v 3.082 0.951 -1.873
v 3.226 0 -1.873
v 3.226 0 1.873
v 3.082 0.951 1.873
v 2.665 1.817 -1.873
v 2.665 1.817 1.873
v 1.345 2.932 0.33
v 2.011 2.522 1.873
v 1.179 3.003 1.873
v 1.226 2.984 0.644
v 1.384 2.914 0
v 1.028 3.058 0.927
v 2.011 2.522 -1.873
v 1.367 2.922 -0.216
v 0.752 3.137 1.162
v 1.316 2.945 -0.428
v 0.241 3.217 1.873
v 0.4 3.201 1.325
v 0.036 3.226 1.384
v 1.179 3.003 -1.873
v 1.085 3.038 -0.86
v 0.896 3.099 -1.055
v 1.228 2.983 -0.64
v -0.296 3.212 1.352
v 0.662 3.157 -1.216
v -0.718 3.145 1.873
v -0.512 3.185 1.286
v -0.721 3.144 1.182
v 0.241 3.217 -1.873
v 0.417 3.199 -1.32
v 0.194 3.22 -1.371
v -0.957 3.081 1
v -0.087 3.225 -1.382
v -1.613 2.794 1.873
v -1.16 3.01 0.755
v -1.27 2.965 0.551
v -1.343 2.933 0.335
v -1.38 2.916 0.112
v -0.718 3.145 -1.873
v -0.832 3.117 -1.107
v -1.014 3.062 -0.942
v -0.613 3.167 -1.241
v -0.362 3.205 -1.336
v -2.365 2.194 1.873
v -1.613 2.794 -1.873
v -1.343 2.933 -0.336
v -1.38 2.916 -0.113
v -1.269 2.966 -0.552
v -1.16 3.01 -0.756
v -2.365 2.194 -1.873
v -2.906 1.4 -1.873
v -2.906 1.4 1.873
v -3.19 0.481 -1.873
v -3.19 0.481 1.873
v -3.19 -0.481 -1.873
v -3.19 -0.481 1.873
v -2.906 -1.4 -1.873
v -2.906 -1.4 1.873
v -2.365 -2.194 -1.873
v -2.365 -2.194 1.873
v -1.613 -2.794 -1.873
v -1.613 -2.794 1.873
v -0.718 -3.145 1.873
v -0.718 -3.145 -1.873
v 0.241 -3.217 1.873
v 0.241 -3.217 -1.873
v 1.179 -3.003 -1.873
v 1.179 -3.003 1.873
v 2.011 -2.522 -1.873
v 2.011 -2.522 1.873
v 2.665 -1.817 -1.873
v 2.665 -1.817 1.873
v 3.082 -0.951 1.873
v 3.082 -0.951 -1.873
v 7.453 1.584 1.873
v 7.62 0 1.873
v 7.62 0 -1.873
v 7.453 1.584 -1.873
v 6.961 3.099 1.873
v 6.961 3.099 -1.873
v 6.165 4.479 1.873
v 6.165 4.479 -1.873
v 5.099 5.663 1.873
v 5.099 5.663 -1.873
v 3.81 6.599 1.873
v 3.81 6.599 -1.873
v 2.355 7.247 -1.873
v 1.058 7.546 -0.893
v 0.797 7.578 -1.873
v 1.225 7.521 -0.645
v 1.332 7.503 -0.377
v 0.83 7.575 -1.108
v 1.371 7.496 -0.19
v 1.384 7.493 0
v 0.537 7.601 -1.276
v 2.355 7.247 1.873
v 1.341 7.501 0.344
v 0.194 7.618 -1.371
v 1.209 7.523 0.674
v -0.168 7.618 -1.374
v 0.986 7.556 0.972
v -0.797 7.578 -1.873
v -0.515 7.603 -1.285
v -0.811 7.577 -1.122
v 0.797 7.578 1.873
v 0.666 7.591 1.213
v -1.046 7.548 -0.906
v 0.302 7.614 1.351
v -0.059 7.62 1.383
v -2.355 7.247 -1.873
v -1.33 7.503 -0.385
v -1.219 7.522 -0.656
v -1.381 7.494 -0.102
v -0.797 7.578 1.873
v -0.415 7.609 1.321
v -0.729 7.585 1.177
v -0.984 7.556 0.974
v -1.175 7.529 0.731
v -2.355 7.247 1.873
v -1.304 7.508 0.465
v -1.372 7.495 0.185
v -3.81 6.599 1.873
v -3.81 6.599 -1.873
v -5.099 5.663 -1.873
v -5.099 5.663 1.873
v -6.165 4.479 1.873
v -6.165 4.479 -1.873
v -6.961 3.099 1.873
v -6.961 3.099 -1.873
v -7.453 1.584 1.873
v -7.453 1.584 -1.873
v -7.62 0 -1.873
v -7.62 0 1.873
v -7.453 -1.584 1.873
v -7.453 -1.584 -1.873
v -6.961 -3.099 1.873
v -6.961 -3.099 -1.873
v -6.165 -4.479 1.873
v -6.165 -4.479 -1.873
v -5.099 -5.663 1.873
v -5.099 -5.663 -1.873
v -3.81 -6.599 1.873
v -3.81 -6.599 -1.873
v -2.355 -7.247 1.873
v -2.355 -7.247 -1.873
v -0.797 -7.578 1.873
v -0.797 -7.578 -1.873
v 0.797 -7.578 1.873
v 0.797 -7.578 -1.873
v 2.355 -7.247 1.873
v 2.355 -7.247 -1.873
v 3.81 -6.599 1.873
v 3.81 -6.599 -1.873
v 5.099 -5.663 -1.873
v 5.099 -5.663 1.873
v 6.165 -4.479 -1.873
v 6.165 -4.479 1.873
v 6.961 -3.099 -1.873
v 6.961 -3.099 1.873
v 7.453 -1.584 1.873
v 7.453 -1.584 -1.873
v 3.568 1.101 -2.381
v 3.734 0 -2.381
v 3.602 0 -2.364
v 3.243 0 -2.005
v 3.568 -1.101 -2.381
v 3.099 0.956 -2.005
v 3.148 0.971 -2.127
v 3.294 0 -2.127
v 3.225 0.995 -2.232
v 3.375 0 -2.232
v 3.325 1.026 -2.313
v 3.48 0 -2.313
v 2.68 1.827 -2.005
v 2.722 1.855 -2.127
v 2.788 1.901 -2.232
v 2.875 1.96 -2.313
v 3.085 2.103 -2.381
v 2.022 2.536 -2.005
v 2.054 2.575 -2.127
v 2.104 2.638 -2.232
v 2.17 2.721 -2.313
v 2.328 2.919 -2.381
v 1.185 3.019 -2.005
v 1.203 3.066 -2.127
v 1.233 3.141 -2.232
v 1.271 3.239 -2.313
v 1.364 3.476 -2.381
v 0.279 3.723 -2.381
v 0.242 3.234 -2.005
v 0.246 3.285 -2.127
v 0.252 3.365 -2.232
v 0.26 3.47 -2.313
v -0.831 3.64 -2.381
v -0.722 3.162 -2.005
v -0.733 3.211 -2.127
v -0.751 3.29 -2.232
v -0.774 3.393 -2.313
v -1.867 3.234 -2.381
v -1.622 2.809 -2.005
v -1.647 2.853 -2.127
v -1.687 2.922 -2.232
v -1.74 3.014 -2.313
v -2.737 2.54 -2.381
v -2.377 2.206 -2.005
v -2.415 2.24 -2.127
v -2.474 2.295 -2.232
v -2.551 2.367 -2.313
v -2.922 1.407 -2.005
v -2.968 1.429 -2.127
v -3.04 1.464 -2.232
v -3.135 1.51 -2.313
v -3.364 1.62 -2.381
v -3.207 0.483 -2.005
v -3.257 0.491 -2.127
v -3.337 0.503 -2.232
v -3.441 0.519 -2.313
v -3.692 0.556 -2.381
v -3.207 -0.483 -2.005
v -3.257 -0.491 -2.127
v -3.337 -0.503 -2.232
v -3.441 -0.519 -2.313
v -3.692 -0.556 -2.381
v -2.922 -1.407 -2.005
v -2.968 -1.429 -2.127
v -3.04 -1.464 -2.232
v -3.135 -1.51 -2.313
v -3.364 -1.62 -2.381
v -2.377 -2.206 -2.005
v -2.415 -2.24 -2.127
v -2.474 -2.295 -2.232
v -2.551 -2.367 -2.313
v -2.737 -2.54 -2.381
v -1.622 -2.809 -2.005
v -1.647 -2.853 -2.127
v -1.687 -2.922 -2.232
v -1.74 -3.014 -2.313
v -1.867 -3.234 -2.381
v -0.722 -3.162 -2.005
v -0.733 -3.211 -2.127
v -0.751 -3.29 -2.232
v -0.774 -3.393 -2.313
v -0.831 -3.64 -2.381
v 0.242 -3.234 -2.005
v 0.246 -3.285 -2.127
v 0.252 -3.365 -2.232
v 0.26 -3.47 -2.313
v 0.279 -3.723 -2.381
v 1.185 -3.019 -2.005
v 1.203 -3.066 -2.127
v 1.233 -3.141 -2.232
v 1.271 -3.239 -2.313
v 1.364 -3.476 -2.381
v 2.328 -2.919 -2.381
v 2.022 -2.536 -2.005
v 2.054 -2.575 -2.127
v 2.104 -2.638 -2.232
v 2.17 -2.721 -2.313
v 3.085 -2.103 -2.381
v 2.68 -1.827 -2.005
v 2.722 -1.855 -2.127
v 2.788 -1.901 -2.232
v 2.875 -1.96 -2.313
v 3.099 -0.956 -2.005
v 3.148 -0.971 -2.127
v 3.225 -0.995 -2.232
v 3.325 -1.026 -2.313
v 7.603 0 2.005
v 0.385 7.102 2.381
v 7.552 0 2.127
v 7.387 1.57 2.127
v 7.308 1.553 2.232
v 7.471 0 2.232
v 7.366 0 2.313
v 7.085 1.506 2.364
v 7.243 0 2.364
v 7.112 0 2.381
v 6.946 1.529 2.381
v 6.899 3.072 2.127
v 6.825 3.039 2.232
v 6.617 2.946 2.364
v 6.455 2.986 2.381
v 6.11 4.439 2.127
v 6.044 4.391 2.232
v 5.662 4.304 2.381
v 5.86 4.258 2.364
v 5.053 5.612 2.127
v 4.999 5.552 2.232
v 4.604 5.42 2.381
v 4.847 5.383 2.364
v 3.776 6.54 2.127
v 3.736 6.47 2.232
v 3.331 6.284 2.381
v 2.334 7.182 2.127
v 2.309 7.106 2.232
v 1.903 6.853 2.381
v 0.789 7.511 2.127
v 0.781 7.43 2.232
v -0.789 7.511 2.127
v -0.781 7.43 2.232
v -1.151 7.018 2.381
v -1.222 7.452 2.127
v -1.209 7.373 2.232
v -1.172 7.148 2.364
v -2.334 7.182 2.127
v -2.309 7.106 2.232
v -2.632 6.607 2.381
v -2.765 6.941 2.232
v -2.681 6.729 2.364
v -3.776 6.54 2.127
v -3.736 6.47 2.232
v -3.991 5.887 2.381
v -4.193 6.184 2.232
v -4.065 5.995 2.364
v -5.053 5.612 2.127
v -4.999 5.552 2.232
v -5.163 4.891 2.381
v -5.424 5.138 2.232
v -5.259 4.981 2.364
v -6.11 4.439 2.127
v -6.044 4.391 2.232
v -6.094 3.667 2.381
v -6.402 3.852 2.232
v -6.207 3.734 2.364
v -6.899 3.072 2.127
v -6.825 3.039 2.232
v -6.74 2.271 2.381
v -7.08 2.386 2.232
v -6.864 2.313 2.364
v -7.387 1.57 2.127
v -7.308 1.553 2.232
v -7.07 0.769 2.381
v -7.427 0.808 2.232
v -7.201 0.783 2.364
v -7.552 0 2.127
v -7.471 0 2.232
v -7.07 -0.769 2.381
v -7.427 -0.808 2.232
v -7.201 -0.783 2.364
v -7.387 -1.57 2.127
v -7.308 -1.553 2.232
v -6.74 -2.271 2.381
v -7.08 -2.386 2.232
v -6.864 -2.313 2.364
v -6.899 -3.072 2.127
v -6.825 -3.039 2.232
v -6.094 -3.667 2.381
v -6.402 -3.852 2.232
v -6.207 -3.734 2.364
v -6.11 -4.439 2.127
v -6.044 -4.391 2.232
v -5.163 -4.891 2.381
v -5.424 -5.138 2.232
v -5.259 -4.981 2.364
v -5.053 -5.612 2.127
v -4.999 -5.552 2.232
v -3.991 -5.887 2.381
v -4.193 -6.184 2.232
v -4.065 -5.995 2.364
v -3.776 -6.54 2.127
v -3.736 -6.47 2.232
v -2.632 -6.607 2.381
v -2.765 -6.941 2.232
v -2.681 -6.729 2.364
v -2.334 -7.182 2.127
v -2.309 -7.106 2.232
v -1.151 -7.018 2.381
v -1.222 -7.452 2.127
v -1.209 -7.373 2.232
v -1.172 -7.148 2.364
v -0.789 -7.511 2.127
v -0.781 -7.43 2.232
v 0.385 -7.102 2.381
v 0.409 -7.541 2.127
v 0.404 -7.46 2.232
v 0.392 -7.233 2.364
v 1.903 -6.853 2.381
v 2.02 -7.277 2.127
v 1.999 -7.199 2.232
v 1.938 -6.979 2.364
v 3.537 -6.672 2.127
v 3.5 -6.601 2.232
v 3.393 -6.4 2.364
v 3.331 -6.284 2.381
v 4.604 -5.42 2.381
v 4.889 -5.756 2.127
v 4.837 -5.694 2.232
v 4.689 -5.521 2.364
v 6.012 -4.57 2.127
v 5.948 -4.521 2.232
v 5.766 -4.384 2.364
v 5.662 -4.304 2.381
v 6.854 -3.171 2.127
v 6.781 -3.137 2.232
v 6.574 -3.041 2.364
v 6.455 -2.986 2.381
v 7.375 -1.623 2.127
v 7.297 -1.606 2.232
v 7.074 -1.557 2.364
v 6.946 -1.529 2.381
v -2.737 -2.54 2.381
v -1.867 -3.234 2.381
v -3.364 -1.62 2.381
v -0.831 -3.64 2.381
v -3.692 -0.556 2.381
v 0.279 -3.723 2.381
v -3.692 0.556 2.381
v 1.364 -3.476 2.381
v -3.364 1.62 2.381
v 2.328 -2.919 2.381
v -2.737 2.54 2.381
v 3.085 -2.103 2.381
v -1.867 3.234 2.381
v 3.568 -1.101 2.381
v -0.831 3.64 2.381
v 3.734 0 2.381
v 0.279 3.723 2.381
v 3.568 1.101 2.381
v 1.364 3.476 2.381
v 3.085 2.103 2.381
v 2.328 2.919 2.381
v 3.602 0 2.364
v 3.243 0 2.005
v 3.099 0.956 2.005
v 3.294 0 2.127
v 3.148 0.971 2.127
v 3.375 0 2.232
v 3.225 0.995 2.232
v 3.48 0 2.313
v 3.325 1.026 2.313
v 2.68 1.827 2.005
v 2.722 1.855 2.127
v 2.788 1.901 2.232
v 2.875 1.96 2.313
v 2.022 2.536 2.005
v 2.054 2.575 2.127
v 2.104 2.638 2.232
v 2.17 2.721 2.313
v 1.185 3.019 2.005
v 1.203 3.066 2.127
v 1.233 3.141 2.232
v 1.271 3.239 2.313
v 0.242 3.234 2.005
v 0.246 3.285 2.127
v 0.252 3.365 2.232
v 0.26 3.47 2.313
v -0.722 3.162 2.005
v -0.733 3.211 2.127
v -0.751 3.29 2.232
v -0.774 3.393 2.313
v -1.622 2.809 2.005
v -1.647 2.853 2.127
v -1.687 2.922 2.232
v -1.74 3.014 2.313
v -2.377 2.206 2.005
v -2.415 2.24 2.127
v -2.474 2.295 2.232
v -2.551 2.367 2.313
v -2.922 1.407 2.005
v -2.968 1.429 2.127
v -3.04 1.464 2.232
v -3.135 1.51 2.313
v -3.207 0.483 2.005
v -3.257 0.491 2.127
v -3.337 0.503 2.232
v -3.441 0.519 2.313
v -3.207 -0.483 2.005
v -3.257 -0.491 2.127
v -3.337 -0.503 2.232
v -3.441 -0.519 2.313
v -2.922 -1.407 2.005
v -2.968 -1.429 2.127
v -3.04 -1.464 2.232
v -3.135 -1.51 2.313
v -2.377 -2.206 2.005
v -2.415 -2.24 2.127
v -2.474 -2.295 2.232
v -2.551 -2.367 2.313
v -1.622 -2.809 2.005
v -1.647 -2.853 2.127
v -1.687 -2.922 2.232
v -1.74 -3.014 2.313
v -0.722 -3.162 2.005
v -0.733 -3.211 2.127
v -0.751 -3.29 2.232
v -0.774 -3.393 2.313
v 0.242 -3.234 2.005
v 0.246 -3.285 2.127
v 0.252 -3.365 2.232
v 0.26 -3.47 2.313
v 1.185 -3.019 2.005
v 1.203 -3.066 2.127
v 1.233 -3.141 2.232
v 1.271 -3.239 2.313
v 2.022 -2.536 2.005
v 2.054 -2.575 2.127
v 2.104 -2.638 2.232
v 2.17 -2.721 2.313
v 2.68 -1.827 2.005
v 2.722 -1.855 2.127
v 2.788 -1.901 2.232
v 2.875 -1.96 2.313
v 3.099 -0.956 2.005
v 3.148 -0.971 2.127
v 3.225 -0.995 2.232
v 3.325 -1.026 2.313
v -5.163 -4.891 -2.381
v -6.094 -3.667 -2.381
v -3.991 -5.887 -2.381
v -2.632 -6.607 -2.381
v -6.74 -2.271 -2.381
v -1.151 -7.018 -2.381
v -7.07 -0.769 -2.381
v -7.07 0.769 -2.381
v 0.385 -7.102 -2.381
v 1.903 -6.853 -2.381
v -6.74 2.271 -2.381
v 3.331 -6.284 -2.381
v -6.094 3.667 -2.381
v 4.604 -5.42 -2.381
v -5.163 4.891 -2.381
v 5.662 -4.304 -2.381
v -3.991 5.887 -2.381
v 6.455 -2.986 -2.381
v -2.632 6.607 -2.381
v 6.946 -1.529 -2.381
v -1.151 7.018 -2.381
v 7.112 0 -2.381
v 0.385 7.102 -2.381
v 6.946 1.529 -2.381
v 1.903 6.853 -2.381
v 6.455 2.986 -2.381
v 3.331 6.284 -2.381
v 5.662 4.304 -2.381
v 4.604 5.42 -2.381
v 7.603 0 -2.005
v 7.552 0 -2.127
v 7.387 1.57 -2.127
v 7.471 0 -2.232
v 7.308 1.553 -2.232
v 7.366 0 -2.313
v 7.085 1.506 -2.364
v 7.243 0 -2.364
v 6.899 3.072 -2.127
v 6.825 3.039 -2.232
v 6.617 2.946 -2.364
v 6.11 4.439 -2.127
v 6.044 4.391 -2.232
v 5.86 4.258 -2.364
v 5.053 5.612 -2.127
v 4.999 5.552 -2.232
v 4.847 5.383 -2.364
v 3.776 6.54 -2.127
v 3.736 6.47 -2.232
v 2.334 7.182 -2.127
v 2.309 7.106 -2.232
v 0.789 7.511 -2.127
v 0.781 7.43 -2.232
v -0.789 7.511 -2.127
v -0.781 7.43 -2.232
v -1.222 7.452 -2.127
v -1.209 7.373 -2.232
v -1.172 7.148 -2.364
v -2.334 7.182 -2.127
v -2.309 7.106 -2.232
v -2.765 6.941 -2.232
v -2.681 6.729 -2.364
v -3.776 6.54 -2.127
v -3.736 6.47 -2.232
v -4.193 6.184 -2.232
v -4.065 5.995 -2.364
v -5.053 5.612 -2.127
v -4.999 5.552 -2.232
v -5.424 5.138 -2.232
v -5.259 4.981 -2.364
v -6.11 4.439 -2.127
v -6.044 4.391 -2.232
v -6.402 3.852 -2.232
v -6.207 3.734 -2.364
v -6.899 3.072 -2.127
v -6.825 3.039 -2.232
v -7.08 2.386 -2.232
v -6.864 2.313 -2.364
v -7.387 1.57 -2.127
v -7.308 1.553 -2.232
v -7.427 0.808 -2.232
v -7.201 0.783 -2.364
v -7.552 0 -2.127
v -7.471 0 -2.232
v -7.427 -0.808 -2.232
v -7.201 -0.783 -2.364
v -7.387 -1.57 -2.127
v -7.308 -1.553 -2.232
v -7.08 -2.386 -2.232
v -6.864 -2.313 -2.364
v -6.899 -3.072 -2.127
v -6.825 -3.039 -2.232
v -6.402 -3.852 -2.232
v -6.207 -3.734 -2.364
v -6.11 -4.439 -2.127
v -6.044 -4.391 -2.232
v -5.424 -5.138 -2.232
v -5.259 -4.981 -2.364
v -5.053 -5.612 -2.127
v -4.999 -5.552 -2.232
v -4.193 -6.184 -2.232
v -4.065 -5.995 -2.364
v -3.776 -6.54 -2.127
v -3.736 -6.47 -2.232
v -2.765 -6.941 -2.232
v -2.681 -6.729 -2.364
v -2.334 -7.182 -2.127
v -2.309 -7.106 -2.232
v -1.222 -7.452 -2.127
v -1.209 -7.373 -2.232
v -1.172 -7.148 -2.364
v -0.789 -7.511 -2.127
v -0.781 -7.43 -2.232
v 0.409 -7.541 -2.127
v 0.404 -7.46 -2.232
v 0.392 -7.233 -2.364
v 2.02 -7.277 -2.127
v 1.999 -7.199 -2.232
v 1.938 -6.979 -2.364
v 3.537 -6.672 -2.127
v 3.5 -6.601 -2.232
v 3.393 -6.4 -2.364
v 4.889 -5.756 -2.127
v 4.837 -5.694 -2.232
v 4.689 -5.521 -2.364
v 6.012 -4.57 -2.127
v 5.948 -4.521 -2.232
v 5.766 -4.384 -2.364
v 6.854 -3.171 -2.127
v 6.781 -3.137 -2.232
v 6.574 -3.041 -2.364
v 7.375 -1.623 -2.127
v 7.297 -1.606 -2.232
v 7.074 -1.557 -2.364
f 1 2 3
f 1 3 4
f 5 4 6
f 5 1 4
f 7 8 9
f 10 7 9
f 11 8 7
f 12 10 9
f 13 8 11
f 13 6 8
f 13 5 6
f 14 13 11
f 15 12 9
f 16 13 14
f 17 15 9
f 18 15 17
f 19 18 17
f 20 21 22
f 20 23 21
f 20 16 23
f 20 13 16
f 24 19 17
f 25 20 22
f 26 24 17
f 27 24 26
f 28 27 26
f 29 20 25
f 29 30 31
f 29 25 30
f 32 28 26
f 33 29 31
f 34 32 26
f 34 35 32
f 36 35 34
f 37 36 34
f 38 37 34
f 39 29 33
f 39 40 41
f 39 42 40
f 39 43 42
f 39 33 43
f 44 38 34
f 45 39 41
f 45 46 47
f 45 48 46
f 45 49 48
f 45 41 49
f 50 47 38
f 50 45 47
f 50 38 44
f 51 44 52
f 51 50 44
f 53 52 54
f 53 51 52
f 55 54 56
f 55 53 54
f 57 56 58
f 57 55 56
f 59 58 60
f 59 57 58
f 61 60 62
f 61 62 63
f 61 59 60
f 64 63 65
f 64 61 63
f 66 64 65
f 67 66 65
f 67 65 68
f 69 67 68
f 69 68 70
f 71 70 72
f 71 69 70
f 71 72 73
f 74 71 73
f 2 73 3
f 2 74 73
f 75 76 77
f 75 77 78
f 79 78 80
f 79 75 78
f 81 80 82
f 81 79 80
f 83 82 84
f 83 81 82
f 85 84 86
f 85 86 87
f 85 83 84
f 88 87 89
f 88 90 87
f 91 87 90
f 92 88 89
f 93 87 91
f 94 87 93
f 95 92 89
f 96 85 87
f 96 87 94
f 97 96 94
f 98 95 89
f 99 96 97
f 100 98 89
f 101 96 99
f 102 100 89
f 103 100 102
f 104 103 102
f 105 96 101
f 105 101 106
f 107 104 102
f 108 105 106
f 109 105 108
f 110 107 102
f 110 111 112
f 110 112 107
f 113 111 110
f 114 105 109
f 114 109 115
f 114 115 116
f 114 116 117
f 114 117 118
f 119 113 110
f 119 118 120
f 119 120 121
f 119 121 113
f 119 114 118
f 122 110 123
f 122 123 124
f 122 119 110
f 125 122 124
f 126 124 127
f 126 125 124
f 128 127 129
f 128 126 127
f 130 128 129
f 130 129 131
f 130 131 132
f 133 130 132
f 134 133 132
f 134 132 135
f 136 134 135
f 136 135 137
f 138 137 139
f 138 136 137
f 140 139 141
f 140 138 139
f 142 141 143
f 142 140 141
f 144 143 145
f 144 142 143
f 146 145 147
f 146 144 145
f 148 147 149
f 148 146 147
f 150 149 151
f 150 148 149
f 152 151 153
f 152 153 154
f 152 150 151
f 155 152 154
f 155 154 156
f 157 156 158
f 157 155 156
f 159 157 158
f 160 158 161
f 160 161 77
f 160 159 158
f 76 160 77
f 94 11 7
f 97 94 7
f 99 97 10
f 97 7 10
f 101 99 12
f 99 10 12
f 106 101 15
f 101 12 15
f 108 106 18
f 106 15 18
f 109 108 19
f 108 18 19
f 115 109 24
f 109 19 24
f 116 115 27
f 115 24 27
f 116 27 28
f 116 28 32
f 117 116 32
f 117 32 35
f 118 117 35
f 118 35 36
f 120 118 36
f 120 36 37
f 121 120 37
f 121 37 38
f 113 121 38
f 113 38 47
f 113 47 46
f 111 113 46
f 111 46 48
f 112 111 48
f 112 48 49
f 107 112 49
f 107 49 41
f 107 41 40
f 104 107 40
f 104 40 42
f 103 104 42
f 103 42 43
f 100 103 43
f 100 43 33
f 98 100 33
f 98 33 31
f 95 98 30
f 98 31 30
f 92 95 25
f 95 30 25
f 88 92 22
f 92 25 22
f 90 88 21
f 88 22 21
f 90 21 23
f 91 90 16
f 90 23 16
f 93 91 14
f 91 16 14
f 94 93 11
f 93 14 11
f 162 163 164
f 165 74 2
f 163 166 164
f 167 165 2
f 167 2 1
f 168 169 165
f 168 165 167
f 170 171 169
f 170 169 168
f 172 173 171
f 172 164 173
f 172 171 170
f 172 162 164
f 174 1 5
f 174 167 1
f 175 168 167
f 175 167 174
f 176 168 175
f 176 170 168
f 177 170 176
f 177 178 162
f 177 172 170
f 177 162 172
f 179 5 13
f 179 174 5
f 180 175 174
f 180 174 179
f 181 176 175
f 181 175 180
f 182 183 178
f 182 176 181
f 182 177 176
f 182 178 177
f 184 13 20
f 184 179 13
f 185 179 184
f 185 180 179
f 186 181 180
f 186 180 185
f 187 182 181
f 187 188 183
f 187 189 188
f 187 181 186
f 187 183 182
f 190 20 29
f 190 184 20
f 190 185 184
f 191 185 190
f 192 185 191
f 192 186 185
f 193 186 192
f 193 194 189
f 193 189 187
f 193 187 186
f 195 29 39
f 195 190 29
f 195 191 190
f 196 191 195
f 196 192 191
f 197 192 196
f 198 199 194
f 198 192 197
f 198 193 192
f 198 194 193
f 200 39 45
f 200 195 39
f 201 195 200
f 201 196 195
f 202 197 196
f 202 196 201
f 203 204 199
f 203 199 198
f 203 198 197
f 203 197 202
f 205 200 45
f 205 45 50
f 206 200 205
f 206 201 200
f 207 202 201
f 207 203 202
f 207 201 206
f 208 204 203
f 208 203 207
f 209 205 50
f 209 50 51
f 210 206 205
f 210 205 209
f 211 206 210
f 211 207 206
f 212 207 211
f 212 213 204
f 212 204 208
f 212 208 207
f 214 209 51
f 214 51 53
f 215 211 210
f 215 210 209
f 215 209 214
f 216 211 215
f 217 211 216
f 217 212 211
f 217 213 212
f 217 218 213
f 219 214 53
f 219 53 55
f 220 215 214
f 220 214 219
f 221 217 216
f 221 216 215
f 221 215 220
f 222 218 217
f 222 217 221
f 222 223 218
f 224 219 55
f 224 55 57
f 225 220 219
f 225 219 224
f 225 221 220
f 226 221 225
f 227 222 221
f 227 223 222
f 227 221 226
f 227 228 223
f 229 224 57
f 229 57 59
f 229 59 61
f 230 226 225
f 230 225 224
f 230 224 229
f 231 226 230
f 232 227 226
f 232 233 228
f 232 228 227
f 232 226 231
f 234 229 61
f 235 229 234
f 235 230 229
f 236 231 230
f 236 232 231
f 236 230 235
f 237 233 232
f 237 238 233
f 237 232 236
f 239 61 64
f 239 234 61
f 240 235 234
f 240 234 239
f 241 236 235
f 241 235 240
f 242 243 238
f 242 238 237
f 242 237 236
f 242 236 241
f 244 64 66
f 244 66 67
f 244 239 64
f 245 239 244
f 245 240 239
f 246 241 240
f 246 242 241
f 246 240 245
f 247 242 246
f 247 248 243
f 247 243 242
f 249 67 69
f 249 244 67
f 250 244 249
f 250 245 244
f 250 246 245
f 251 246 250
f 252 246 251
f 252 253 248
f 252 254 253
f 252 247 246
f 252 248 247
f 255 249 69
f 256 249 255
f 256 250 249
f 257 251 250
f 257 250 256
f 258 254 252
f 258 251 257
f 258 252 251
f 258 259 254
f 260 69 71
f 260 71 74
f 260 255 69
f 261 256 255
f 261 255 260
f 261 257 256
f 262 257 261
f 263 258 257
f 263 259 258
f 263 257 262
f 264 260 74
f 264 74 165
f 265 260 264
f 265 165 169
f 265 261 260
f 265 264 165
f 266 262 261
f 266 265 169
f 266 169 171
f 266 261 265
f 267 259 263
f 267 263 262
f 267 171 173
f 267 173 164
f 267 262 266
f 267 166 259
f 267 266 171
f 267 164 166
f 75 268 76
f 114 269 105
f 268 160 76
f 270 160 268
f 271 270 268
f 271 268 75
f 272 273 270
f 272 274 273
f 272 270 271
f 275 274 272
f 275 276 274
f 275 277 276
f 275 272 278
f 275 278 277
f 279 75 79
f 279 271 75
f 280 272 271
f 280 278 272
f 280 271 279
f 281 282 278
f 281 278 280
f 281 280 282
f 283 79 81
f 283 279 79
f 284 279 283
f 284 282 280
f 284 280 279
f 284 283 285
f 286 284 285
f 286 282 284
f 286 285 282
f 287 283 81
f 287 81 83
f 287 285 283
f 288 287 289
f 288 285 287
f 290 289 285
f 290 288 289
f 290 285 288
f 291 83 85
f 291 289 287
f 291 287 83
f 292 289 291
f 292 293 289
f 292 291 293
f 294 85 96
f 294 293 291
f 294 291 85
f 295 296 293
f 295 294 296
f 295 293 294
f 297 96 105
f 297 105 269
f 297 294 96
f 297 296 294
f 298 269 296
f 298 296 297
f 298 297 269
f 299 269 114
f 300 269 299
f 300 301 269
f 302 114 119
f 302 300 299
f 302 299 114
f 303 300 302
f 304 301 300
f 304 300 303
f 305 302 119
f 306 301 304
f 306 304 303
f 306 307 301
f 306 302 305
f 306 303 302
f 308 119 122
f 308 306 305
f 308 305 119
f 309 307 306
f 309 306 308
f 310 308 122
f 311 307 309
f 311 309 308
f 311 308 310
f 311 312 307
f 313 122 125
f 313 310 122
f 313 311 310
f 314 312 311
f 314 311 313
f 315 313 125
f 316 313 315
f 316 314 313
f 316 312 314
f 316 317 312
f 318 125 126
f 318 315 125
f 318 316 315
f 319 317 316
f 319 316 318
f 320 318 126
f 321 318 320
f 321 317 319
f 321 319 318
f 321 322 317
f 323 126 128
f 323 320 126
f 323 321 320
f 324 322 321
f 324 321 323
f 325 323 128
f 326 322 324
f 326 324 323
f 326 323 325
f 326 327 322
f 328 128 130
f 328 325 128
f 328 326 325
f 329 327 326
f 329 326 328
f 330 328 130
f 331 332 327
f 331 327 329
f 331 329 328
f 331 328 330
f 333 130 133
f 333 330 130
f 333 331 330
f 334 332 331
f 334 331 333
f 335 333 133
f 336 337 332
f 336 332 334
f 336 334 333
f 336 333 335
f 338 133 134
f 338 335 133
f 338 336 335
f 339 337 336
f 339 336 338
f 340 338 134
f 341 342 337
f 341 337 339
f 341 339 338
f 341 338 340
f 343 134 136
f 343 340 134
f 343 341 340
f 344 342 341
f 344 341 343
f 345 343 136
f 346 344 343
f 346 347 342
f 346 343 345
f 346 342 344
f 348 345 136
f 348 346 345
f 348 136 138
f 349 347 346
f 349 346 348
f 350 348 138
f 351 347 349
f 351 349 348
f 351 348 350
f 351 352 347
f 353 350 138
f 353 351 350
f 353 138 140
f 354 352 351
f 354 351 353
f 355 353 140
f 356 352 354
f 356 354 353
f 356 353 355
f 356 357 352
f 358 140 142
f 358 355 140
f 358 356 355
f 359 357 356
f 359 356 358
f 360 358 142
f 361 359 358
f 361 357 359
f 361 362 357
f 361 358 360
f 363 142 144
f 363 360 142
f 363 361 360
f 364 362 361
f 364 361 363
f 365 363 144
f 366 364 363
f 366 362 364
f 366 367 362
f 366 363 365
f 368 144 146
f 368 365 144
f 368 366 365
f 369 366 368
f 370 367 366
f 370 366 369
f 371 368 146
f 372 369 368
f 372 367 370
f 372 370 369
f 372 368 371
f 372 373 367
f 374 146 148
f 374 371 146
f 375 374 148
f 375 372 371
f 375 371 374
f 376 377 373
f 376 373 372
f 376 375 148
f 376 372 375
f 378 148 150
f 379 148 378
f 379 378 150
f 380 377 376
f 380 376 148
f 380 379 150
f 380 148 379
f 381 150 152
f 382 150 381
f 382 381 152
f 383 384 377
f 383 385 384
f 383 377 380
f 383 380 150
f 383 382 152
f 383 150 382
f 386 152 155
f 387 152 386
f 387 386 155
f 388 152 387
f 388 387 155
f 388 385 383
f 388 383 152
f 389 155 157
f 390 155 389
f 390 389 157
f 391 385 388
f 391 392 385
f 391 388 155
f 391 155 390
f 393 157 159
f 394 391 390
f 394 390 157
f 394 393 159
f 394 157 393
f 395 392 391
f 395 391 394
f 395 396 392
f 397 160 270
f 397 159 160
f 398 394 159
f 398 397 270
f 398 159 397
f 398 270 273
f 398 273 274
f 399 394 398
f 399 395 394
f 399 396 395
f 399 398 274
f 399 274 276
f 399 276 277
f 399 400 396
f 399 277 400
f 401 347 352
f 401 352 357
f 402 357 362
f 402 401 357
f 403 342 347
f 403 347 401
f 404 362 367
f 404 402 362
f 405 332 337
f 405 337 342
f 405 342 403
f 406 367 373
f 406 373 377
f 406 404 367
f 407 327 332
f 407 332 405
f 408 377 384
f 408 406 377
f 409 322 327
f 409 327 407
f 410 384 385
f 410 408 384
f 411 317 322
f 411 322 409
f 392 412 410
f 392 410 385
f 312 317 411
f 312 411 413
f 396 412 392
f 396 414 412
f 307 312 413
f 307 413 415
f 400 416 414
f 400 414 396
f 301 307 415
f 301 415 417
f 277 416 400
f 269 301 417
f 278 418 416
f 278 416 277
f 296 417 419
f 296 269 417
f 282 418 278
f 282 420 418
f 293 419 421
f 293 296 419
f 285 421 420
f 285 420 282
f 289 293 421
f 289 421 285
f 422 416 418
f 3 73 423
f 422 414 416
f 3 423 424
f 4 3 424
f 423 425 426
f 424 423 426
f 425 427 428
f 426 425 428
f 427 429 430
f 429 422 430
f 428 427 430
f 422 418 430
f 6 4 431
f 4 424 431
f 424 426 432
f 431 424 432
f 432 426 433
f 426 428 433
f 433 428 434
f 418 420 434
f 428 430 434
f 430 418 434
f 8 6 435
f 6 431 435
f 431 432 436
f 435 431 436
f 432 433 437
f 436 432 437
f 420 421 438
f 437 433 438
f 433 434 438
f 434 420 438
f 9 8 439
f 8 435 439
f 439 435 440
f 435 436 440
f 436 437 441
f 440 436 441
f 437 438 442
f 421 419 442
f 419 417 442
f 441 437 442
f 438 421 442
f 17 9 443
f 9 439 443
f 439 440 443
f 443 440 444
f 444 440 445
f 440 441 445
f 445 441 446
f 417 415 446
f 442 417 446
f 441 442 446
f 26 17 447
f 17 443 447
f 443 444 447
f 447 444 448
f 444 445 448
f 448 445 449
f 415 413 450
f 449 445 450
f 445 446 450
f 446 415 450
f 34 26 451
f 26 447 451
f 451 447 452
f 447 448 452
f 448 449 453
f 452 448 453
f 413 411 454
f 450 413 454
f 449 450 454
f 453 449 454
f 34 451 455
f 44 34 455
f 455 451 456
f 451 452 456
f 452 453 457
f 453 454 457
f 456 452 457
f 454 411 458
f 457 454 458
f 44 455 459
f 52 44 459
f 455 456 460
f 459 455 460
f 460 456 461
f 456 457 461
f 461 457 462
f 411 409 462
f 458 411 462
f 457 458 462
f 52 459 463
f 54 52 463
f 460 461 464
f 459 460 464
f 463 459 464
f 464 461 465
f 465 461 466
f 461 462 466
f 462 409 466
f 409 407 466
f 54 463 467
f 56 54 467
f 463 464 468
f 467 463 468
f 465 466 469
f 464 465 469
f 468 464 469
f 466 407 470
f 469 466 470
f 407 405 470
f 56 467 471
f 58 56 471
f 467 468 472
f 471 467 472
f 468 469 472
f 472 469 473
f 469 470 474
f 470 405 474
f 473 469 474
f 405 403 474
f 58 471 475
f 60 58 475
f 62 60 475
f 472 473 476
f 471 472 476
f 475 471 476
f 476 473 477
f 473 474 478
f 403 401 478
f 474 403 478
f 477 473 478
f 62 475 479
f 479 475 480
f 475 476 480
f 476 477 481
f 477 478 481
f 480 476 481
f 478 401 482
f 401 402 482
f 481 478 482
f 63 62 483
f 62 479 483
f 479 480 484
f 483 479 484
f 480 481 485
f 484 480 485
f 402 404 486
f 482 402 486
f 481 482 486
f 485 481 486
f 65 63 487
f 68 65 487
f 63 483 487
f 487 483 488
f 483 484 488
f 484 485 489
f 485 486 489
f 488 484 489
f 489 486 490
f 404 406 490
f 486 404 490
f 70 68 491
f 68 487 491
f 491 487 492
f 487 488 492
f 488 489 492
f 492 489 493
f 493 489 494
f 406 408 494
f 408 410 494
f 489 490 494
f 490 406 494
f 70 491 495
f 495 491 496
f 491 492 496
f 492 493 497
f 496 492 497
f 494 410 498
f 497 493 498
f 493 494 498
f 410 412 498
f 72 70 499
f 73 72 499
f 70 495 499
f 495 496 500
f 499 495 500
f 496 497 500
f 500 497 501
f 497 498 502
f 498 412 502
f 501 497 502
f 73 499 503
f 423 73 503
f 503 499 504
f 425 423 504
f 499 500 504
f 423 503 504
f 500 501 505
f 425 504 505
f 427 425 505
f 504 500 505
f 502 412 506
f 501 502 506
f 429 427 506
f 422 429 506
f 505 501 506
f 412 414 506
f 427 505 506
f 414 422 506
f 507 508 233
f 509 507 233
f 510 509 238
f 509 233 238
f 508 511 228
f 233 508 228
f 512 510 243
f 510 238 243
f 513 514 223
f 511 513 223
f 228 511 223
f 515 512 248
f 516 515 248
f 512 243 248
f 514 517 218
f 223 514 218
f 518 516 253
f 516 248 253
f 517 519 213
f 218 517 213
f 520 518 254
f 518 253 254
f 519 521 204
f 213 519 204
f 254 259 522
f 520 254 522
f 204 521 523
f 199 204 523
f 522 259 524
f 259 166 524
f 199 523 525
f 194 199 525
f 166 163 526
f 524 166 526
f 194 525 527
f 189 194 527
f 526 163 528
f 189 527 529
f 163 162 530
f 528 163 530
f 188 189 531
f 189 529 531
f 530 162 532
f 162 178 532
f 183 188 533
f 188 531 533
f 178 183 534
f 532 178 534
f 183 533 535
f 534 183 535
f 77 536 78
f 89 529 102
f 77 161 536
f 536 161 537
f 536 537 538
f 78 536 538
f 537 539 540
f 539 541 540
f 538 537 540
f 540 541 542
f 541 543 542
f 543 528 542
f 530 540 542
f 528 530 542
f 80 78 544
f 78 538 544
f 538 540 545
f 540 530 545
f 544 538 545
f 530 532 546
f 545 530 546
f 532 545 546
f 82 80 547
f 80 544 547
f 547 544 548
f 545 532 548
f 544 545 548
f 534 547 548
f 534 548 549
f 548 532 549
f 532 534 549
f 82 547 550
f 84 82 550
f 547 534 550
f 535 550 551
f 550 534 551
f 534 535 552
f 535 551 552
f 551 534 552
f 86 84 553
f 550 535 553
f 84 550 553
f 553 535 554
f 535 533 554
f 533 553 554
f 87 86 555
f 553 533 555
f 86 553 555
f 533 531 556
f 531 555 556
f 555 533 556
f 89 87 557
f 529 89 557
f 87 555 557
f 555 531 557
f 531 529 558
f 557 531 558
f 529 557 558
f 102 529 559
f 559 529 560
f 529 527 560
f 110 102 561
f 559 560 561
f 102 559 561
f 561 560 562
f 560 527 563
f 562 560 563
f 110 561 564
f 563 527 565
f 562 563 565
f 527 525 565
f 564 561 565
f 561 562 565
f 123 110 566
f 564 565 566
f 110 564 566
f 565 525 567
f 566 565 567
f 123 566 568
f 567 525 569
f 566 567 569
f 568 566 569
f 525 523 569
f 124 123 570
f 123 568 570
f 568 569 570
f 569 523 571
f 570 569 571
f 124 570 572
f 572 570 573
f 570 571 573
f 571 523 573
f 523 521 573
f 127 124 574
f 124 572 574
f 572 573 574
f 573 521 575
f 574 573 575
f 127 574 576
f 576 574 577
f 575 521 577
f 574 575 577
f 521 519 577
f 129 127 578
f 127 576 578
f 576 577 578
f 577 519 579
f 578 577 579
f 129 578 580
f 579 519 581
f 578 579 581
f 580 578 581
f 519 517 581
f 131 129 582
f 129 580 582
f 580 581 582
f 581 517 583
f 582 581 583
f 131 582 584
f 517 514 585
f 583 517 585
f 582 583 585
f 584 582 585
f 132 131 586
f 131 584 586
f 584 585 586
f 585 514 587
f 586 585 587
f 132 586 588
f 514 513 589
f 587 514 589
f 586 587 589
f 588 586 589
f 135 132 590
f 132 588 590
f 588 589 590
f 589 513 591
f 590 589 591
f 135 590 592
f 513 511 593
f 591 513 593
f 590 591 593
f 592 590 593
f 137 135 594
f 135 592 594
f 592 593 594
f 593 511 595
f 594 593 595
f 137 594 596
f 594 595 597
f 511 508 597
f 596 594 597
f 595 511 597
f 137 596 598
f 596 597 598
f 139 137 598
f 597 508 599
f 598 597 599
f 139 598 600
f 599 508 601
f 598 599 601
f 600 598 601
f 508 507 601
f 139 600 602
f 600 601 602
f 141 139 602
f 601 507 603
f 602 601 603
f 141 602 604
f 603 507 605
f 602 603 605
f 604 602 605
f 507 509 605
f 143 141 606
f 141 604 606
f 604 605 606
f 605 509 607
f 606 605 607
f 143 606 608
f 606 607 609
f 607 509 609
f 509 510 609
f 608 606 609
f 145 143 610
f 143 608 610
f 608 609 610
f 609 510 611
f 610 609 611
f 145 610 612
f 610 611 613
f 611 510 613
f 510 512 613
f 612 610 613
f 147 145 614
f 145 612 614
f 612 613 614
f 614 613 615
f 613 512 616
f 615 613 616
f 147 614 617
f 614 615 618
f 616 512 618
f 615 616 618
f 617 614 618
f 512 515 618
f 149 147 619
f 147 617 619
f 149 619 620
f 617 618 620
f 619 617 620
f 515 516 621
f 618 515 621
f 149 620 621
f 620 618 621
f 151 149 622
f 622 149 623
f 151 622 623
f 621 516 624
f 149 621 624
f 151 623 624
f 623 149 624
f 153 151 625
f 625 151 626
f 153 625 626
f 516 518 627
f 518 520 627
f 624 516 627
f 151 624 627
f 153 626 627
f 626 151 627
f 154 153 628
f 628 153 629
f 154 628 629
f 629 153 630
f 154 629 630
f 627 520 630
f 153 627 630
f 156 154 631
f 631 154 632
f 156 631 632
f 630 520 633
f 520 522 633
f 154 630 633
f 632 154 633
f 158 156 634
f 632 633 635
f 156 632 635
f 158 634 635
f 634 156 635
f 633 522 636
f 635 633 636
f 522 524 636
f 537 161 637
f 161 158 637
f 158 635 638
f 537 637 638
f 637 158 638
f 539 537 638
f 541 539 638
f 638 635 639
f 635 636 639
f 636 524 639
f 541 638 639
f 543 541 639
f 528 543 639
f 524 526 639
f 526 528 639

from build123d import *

# Parameters (mm, degrees)
F0_R     = 7.62
F0_R_2   = 3.2258
F1_DEPTH = 2.38125
F2_R     = 1.3843
F3_DEPTH = 7.62
F4_R     = 0.508


with BuildPart() as f1:
    # F0 (on Top) → F1 (new body, symmetric)
    with BuildSketch(Plane.XY):
        Circle(F0_R)
        Circle(F0_R_2, mode=Mode.SUBTRACT)
    extrude(amount=F1_DEPTH, both=True)

    # F2 (on Front) → F3 (cut)
    with BuildSketch(Plane.XZ):
        Circle(F2_R)
    extrude(amount=-F3_DEPTH, mode=Mode.SUBTRACT)

    # F4
    f4_edges = [f1.edges().sort_by_distance(p)[0] for p in [
        (-7.62, 0, 2.38125),
        (-7.62, 0, -2.38125),
        (-3.2258, 0, -2.38125),
        (-3.2258, 0, 2.38125),
    ]]
    fillet(f4_edges, radius=F4_R)


solid = f1.part
